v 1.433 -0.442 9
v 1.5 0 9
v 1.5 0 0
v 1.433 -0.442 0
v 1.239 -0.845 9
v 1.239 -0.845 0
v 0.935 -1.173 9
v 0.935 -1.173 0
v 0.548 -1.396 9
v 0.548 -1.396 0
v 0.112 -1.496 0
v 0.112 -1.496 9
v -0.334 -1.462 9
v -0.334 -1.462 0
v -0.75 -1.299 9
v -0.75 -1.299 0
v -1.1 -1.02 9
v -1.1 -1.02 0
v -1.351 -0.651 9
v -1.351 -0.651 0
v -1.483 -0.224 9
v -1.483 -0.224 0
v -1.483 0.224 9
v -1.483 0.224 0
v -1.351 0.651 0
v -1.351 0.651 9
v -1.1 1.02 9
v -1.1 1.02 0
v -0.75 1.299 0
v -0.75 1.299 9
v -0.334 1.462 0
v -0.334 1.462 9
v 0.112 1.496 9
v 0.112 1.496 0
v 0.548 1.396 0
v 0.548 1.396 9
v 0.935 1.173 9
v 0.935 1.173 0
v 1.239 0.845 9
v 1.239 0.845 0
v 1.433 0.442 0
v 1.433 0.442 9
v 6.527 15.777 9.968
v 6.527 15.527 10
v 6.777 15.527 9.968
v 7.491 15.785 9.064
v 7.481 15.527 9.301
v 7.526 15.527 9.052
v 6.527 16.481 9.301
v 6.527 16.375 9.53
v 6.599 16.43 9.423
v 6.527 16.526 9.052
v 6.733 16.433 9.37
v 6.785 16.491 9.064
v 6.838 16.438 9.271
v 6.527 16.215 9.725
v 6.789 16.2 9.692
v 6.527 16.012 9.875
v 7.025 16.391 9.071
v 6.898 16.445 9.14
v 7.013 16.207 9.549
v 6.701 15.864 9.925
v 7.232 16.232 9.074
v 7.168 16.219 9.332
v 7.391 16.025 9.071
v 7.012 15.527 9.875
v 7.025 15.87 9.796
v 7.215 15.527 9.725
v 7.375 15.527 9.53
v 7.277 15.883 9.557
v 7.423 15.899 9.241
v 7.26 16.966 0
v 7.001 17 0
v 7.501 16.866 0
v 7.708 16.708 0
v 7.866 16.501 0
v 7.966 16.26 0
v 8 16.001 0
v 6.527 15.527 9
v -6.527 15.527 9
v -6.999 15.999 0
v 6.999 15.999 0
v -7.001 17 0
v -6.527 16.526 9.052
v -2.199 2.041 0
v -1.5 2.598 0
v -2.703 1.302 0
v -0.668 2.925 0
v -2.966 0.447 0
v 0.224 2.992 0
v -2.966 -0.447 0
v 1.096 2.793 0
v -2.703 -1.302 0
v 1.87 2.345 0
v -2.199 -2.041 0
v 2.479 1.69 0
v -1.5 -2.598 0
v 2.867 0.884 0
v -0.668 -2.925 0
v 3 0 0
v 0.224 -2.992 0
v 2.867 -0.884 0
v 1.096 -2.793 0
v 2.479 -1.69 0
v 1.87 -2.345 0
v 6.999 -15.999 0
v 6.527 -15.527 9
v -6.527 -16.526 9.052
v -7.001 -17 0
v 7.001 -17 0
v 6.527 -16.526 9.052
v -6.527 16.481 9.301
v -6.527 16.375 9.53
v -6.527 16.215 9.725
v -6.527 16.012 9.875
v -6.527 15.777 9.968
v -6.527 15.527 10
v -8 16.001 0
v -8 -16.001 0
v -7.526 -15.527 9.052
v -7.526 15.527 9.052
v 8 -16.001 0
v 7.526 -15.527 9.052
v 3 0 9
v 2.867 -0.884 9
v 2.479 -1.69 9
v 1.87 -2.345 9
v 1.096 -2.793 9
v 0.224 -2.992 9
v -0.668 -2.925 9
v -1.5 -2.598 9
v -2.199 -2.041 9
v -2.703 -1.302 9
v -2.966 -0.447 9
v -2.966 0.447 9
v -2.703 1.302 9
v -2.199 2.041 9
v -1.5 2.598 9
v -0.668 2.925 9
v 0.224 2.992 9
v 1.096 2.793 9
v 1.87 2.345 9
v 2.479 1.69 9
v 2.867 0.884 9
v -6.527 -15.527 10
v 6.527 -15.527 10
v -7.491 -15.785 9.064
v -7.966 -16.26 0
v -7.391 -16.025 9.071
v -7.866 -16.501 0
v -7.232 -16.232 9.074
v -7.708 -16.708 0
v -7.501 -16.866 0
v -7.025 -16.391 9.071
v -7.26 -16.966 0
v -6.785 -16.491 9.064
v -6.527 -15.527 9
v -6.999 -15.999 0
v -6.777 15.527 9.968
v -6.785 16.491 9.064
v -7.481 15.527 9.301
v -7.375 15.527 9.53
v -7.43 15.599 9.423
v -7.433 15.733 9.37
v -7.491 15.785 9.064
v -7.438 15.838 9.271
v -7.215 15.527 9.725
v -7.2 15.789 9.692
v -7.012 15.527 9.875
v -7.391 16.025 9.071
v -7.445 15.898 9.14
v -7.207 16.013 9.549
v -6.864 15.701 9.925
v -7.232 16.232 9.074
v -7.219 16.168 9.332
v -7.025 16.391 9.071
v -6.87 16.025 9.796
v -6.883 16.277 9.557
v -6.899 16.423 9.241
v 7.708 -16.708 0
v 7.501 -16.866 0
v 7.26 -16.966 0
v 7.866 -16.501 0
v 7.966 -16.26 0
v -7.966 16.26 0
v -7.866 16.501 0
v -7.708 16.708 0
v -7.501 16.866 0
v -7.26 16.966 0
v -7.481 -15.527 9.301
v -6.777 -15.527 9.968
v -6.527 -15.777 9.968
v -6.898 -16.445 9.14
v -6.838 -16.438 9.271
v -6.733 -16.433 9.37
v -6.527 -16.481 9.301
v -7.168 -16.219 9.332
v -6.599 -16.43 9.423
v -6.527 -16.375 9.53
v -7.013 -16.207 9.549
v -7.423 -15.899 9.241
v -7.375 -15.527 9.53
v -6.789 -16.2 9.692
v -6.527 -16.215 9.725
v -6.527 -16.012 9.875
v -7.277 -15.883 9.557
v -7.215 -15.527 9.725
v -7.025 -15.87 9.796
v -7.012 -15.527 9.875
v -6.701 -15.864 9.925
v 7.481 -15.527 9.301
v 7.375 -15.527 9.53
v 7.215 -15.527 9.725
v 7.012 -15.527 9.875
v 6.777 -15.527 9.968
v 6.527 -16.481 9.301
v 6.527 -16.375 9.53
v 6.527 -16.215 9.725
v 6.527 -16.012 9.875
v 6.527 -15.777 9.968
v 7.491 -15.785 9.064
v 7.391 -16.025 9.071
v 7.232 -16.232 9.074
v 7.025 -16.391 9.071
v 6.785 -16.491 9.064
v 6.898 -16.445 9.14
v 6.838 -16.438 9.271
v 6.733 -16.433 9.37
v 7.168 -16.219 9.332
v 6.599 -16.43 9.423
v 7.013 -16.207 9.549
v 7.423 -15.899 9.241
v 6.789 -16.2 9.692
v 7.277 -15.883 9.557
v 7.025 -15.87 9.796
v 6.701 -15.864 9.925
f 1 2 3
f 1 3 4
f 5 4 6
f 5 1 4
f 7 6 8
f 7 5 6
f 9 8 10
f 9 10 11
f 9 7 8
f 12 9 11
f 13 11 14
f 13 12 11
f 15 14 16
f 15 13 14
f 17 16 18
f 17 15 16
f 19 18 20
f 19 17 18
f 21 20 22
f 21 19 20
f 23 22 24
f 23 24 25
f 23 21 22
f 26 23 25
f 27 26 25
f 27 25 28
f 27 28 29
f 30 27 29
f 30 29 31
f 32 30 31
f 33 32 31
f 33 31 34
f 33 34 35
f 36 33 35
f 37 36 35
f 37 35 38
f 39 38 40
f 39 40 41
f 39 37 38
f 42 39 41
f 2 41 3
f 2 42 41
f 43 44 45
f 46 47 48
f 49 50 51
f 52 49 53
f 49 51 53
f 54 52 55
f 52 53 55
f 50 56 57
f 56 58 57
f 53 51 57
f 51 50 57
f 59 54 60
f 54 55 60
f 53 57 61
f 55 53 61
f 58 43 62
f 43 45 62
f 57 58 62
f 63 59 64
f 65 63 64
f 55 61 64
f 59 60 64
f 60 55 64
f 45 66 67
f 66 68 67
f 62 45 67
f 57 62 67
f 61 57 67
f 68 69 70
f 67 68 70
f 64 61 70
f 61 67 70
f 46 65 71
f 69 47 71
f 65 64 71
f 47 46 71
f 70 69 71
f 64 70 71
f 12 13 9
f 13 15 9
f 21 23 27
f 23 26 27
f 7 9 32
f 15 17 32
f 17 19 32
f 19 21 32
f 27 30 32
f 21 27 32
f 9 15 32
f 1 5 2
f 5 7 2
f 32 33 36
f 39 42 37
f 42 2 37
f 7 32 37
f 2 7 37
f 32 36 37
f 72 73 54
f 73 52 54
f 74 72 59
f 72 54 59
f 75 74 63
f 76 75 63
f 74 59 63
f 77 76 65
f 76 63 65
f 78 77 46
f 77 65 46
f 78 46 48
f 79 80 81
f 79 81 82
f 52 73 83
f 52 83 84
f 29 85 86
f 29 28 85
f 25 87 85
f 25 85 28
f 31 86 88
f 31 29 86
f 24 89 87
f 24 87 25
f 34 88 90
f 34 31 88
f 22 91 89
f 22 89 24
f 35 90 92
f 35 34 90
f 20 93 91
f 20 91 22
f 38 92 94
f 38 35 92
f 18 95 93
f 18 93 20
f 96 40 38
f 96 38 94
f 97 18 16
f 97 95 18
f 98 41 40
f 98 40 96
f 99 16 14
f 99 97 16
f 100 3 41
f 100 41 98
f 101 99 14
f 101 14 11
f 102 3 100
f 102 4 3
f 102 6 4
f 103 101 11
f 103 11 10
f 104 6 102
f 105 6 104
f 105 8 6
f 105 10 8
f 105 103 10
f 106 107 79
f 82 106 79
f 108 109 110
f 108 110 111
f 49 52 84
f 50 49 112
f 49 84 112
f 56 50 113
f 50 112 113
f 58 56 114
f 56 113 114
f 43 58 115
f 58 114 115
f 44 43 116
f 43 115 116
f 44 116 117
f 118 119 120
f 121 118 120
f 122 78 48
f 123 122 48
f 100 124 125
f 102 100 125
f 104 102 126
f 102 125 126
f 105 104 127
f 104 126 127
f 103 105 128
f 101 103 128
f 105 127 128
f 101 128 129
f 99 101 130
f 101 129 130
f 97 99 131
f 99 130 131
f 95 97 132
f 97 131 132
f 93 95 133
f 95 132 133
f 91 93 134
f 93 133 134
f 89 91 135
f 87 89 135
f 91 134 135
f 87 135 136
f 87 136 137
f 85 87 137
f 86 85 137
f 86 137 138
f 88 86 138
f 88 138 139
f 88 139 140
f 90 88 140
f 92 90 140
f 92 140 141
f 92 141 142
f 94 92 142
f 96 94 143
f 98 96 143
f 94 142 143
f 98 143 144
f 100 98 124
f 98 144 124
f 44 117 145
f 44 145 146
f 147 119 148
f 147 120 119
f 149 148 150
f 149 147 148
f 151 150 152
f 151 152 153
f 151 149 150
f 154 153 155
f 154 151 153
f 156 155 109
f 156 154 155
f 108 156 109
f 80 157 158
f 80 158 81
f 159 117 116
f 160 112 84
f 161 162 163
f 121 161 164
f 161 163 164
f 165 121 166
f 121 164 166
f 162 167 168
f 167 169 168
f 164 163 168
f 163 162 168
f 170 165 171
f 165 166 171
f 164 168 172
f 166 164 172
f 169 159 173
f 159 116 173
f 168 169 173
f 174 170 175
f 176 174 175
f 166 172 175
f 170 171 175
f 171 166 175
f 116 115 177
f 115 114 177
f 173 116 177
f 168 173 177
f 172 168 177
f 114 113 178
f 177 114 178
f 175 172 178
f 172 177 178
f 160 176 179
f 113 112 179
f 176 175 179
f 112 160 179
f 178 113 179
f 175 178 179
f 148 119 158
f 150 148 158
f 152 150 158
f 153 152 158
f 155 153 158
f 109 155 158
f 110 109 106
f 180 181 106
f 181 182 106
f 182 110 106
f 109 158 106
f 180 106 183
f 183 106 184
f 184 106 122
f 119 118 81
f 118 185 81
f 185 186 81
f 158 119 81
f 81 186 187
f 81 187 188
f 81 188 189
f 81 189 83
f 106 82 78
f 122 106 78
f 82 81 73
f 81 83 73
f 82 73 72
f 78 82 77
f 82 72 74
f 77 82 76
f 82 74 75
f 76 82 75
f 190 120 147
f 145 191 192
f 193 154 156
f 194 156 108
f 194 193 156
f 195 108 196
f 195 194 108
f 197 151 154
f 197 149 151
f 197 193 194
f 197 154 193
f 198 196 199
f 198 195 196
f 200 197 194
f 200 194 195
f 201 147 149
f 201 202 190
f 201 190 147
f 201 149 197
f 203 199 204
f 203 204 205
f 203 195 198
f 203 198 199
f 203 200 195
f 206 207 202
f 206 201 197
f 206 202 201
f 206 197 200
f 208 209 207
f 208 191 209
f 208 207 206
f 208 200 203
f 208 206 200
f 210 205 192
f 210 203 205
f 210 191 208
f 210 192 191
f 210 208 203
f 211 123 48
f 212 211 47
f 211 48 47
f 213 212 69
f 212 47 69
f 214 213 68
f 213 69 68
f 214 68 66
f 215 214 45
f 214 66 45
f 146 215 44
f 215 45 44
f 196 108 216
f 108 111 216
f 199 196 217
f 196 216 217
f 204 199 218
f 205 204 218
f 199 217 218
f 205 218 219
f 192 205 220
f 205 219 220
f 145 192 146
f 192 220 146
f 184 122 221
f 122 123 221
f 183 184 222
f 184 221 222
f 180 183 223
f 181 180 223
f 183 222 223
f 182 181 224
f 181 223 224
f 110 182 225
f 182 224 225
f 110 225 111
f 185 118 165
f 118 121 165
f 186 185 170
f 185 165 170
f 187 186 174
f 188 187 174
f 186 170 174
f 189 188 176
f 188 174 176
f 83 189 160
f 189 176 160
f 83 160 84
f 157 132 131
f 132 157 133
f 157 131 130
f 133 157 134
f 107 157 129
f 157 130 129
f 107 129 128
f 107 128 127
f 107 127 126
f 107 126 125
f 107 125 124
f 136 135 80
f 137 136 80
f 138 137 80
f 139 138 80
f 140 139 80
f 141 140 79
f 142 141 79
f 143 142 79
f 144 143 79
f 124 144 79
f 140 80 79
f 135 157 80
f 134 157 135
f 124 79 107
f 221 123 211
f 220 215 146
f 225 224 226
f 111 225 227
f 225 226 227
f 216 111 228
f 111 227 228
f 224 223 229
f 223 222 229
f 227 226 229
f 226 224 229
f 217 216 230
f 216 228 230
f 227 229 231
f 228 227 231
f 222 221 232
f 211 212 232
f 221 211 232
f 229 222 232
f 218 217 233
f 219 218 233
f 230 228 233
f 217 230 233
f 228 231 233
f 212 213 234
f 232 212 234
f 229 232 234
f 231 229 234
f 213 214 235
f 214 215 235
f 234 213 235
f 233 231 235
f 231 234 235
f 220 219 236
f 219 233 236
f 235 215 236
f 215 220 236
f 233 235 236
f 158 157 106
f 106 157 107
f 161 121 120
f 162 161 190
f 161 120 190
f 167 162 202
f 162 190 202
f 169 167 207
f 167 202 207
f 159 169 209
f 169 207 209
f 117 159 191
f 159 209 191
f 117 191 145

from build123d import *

# Parameters (mm, degrees)
ESQUISSE1_W        = 16
ESQUISSE1_H        = 34
BOSS_EXTRU_1_DEPTH = 10
BOSS_EXTRU_1_TAPER = 3
CONG_1_R           = 1
COQUE1_OUTLINE_W   = 13.05391528
COQUE1_OUTLINE_H   = 31.05391528
COQUE1_DEPTH       = 9
COQUE1_DRAFT       = 3
ESQUISSE2_R        = 3
ESQUISSE2_R_2      = 1.5
BOSS_EXTRU_2_DEPTH = 9


# Read off the part's stored shape, not the designer's step: Coque1
with BuildPart() as part:
    # Esquisse1 → Boss.-Extru.1 (new body)
    with BuildSketch(Plane.XY):
        Rectangle(ESQUISSE1_W, ESQUISSE1_H)
    extrude(amount=BOSS_EXTRU_1_DEPTH, taper=BOSS_EXTRU_1_TAPER)

    # Congé1
    cong_1_edges = [part.edges().sort_by_distance(p)[0] for p in [
        (7.475922207, 0, 10),
        (0, 16.475922207, 10),
        (-7.475922207, 0, 10),
        (-7.737960642, 16.737960642, 5.000008814),
        (7.737961104, 16.737961104, 5),
        (7.737960642, -16.737960642, 5.000008814),
        (-7.737961104, -16.737961104, 5),
        (0, -16.475922207, 10),
    ]]
    fillet(cong_1_edges, radius=CONG_1_R)


with BuildPart() as coque1_tool:
    # Coque1 outline → Coque1 (with draft: the straight prism first)
    with BuildSketch(Plane.XY.offset(9)):
        Rectangle(COQUE1_OUTLINE_W, COQUE1_OUTLINE_H)
    extrude(amount=-COQUE1_DEPTH)
    # Coque1: the draft: its side faces are tilted about the plane it starts from
    coque1_sides = [coque1_tool.faces().sort_by_distance(p)[0] for p in [
        (-6.52695764, 0, 4.5),
        (0, -15.52695764, 4.5),
        (6.52695764, 0, 4.5),
        (0, 15.52695764, 4.5),
    ]]
    draft(coque1_sides, Plane.XY.offset(9), COQUE1_DRAFT)


with BuildPart() as part_1:
    add(part.part)

    # Coque1: cut by coque1_tool
    add(coque1_tool.part, mode=Mode.SUBTRACT)

    # Esquisse2 → Boss.-Extru.2 (add)
    with BuildSketch(Plane(origin=(0, 0, 9), x_dir=(-1, 0, 0), z_dir=(0, 0, -1))):
        with Locations(Location((0, 0, 0), (0, 0, 180))):
            Circle(ESQUISSE2_R)
        with Locations(Location((0, 0, 0), (0, 0, 180))):
            Circle(ESQUISSE2_R_2, mode=Mode.SUBTRACT)
    extrude(amount=BOSS_EXTRU_2_DEPTH)


solid = part_1.part
